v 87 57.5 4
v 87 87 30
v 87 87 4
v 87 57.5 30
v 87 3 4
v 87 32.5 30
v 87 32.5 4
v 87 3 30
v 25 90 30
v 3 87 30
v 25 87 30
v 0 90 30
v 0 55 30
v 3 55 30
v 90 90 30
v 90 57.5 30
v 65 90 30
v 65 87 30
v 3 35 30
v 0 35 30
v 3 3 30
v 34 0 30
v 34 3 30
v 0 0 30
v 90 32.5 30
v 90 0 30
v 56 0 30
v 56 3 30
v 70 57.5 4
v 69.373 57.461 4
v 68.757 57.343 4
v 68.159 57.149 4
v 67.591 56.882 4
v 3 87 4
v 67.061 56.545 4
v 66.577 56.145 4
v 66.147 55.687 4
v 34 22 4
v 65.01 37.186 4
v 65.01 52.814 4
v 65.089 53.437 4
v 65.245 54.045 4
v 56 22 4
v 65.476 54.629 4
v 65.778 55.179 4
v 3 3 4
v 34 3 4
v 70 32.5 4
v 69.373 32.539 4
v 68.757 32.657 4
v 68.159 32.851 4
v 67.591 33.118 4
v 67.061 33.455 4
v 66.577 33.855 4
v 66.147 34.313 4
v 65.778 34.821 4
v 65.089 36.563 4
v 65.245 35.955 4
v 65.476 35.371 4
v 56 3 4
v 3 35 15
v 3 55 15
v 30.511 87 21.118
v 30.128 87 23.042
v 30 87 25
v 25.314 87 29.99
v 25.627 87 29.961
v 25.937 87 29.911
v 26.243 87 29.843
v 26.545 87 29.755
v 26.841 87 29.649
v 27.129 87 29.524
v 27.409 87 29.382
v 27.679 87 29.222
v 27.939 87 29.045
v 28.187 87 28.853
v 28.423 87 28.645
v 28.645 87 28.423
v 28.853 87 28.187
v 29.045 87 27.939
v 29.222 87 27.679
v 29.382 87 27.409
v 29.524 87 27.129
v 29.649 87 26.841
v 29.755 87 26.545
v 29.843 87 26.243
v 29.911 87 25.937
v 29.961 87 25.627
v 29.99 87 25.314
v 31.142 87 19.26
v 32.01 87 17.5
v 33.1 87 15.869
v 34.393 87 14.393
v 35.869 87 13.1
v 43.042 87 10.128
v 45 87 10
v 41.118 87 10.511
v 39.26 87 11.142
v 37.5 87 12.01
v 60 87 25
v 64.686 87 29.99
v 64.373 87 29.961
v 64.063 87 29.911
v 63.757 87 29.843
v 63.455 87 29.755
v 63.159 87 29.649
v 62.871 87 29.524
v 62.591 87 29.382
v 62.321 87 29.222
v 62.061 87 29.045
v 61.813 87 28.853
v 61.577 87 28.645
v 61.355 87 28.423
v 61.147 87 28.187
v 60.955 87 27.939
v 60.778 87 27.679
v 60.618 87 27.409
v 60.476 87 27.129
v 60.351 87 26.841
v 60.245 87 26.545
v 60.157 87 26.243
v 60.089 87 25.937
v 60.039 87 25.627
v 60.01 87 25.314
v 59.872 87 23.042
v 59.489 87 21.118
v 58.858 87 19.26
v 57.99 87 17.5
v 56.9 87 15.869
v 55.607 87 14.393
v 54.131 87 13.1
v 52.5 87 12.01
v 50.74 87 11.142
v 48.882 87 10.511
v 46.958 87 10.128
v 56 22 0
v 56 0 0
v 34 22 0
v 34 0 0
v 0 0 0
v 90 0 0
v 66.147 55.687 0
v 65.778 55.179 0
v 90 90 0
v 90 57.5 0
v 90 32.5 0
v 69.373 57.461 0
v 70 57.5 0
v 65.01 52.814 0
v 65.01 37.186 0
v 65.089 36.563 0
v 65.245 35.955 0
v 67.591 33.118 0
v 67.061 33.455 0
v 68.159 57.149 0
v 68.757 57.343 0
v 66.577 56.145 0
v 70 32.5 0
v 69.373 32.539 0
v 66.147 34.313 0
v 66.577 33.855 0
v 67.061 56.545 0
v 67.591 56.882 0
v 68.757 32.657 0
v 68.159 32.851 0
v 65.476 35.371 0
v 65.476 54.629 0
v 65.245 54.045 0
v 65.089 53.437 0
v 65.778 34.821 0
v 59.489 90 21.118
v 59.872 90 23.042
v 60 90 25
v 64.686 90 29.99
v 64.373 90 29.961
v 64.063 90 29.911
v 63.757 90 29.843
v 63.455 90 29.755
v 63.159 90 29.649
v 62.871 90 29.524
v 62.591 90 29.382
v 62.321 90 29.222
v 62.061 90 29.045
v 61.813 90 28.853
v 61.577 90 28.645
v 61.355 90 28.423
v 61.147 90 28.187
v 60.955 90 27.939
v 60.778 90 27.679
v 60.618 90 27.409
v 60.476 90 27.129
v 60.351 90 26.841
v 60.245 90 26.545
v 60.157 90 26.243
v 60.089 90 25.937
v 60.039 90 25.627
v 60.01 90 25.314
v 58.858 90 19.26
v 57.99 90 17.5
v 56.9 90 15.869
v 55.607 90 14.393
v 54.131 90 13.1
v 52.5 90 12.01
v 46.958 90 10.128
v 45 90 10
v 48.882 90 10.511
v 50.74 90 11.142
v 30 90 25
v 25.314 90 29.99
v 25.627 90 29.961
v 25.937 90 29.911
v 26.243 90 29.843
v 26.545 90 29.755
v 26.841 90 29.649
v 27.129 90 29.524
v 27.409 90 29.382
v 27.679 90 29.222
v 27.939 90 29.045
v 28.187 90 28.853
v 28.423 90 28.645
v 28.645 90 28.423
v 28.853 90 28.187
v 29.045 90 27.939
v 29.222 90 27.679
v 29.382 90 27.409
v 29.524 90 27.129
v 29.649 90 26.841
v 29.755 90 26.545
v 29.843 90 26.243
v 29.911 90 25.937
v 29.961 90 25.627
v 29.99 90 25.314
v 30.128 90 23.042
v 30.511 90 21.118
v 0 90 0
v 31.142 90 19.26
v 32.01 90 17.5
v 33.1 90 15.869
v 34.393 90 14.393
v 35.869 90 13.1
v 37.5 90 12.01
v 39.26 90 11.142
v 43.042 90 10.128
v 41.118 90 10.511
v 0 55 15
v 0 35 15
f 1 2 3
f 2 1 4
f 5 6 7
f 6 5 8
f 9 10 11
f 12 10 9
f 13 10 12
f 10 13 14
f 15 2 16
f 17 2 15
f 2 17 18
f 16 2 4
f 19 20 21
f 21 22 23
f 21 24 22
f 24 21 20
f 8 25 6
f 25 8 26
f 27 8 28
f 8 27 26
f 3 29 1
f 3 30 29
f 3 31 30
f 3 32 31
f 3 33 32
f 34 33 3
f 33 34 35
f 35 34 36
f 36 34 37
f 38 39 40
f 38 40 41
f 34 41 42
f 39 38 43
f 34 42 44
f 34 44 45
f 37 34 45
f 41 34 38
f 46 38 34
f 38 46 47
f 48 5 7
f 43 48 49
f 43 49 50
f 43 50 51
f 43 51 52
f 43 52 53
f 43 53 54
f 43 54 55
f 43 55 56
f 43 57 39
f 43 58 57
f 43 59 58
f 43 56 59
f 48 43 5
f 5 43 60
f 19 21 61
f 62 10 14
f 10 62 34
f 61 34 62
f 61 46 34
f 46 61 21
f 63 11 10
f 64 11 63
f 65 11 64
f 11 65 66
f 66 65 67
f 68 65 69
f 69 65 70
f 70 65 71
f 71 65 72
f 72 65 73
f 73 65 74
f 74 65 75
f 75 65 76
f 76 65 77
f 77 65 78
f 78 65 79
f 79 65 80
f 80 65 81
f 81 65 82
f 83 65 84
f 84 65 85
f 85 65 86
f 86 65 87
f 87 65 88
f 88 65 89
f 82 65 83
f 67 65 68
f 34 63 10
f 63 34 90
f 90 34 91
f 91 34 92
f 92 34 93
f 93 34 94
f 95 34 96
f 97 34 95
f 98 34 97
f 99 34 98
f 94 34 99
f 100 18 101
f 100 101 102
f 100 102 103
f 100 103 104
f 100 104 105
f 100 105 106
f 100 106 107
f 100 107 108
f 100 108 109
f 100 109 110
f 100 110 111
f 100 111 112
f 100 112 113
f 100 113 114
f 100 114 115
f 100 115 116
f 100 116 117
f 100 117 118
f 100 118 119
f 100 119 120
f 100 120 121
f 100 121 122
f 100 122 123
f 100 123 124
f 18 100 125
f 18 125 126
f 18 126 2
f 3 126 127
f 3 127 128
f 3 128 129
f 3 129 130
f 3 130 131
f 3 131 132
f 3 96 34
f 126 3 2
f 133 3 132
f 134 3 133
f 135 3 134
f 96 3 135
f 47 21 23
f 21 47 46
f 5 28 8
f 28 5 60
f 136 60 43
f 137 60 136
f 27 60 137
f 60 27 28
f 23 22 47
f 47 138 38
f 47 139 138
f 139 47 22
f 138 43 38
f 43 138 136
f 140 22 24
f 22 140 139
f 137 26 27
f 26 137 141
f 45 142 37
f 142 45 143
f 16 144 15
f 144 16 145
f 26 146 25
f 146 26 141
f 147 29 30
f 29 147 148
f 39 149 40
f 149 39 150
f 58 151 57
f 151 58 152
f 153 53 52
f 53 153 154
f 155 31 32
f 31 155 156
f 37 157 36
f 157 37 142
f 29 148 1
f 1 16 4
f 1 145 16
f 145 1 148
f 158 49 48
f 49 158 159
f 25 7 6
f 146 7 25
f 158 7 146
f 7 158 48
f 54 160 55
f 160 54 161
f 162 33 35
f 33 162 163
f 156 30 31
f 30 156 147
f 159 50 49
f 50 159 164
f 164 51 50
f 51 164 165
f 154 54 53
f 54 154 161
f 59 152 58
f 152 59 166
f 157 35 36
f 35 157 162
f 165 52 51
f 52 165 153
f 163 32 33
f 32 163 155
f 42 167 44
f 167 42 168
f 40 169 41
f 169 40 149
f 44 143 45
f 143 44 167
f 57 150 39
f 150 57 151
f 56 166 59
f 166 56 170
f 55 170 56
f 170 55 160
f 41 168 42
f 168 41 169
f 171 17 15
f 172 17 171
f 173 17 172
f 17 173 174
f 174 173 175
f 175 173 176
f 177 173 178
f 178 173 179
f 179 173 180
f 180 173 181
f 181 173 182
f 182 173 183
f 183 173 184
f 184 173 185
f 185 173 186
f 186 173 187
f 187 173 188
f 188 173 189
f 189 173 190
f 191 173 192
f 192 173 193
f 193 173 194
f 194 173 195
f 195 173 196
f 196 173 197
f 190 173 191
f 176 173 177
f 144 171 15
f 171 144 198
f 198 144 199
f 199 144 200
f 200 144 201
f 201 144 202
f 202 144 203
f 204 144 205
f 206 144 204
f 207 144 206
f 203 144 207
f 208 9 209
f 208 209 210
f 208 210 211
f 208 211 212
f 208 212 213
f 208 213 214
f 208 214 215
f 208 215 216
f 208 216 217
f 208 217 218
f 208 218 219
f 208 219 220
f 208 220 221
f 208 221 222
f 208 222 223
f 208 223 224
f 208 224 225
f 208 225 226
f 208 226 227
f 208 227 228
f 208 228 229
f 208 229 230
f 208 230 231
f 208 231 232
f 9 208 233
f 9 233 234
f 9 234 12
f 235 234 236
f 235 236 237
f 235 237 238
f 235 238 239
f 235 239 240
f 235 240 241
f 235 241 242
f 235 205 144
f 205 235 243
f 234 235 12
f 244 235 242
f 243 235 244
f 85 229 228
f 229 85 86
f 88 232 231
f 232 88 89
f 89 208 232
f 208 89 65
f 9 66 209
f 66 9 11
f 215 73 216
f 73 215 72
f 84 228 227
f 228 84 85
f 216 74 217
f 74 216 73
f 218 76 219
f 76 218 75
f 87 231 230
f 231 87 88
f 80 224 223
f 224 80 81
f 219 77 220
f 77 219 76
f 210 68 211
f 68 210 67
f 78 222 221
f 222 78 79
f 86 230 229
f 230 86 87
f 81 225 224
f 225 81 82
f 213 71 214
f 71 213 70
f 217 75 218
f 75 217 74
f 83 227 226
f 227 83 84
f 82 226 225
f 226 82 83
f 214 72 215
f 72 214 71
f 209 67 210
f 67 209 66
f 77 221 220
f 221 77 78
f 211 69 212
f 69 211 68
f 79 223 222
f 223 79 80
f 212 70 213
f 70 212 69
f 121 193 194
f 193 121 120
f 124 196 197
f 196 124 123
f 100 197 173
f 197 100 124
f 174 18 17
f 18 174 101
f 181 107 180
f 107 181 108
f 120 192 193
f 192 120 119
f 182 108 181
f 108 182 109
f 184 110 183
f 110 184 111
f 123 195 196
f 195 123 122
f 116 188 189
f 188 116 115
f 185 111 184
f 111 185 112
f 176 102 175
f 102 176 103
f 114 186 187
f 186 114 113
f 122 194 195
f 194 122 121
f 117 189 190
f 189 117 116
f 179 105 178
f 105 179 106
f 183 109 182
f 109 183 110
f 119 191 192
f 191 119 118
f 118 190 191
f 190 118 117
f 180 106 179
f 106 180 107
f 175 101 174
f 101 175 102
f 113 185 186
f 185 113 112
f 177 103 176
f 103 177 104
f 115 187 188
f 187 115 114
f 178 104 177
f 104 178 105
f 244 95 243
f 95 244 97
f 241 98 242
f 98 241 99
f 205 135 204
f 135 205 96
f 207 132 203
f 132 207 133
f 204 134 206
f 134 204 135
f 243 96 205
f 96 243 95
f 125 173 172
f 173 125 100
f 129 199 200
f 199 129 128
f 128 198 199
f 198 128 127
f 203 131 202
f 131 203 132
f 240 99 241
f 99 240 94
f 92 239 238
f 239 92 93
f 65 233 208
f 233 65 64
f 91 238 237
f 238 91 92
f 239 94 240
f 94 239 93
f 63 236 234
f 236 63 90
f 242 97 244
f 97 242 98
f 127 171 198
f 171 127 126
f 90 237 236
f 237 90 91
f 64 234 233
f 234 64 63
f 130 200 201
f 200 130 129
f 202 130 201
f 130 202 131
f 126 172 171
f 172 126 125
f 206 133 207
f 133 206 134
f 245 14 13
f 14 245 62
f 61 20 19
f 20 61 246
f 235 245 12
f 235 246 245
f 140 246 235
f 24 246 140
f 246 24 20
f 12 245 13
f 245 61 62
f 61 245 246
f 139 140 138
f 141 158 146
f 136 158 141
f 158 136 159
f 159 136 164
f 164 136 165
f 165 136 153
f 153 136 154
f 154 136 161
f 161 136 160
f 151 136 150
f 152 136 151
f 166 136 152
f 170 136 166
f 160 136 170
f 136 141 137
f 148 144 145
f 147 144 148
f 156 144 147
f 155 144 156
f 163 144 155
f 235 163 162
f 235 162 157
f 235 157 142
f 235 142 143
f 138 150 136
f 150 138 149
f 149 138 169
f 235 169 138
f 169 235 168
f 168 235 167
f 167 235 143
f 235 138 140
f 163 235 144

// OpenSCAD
$fn=48;
translate([0,0,0])
{
difference()
{
    cube(size = [90.00, 90.00, 30.00], center = false); 
    translate(v = [3.00, 3.00, 4.00])
    {
        union()
        {
            union()
            {
                union()
                {
                    union()
                    {
                        cube(size = [84.00, 84.00, 26.00], center = false); 
                        translate(v = [31.00, -3.00, -14.00])
                        {
                            translate(v = [0.00, 0.00, 0.00])
                            {
                                cube(size = [22.00, 22.00, 40.00], center = false); 
                            }
                        }
                    }
                    translate(v = [87.00, 29.50, -12.00])
                    {
                        rotate([0.00, 0.00, 90.00])
                        {
                            translate(v = [0.00, 0.00, 0.00])
                            {
                                hull()
                                {
                                    translate(v = [5.00, 20.00, 0.00])
                                    {
                                        cylinder(center = false, r1 = 5, r2 = 5, h = 38, $fn = 50);
                                    }
                                    translate(v = [20.00, 20.00, 0.00])
                                    {
                                        cylinder(center = false, r1 = 5, r2 = 5, h = 38, $fn = 50);
                                    }
                                    translate(v = [0.00, 0.00, 0.00])
                                    {
                                        cube(size = [25.00, 1.00, 38.00], center = false); 
                                    }
                                }
                            }
                        }
                    }
                }
                translate(v = [22.00, 72.00, 6.00])
                {
                    translate(v = [0.00, 0.00, 0.00])
                    {
                        translate(v = [20.00, 0.00, 15.00])
                        {
                            union()
                            {
                                hull()
                                {
                                    rotate([90.00, 0.00, 0.00])
                                    {
                                        difference()
                                        {
                                            cylinder(center = true, r1 = 15, r2 = 15, h = 30);
                                            translate(v = [-30.00, 0.00, -15.00])
                                            {
                                                cube(size = [60.00, 30.00, 30.00], center = false); 
                                            }
                                        }
                                    }
                                    translate(v = [-15.00, -15.00, 0.00])
                                    {
                                        cube(size = [30.00, 30.00, 5.00], center = false); 
                                    }
                                }
                                translate(v = [-20.00, -15.00, 0.00])
                                {
                                    difference()
                                    {
                                        cube(size = [5.00, 30.00, 5.00], center = false); 
                                        translate(v = [0.00, 30.00, 0.00])
                                        {
                                            rotate([90.00, 0.00, 0.00])
                                            {
                                                cylinder(center = false, r1 = 5, r2 = 5, h = 30, $fn = 100);
                                            }
                                        }
                                    }
                                }
                                mirror([30.00, 0.00, 0.00])
                                {
                                    translate(v = [-20.00, -15.00, 0.00])
                                    {
                                        difference()
                                        {
                                            cube(size = [5.00, 30.00, 5.00], center = false); 
                                            translate(v = [0.00, 30.00, 0.00])
                                            {
                                                rotate([90.00, 0.00, 0.00])
                                                {
                                                    cylinder(center = false, r1 = 5, r2 = 5, h = 30, $fn = 100);
                                                }
                                            }
                                        }
                                    }
                                }
                            }
                        }
                    }
                }
            }
            translate(v = [17.00, 32.00, 11.00])
            {
                rotate([0.00, 0.00, 90.00])
                {
                    translate(v = [0.00, 0.00, 0.00])
                    {
                        cube(size = [20.00, 20.00, 15.00], center = false); 
                    }
                }
            }
        }
    }
}

}
